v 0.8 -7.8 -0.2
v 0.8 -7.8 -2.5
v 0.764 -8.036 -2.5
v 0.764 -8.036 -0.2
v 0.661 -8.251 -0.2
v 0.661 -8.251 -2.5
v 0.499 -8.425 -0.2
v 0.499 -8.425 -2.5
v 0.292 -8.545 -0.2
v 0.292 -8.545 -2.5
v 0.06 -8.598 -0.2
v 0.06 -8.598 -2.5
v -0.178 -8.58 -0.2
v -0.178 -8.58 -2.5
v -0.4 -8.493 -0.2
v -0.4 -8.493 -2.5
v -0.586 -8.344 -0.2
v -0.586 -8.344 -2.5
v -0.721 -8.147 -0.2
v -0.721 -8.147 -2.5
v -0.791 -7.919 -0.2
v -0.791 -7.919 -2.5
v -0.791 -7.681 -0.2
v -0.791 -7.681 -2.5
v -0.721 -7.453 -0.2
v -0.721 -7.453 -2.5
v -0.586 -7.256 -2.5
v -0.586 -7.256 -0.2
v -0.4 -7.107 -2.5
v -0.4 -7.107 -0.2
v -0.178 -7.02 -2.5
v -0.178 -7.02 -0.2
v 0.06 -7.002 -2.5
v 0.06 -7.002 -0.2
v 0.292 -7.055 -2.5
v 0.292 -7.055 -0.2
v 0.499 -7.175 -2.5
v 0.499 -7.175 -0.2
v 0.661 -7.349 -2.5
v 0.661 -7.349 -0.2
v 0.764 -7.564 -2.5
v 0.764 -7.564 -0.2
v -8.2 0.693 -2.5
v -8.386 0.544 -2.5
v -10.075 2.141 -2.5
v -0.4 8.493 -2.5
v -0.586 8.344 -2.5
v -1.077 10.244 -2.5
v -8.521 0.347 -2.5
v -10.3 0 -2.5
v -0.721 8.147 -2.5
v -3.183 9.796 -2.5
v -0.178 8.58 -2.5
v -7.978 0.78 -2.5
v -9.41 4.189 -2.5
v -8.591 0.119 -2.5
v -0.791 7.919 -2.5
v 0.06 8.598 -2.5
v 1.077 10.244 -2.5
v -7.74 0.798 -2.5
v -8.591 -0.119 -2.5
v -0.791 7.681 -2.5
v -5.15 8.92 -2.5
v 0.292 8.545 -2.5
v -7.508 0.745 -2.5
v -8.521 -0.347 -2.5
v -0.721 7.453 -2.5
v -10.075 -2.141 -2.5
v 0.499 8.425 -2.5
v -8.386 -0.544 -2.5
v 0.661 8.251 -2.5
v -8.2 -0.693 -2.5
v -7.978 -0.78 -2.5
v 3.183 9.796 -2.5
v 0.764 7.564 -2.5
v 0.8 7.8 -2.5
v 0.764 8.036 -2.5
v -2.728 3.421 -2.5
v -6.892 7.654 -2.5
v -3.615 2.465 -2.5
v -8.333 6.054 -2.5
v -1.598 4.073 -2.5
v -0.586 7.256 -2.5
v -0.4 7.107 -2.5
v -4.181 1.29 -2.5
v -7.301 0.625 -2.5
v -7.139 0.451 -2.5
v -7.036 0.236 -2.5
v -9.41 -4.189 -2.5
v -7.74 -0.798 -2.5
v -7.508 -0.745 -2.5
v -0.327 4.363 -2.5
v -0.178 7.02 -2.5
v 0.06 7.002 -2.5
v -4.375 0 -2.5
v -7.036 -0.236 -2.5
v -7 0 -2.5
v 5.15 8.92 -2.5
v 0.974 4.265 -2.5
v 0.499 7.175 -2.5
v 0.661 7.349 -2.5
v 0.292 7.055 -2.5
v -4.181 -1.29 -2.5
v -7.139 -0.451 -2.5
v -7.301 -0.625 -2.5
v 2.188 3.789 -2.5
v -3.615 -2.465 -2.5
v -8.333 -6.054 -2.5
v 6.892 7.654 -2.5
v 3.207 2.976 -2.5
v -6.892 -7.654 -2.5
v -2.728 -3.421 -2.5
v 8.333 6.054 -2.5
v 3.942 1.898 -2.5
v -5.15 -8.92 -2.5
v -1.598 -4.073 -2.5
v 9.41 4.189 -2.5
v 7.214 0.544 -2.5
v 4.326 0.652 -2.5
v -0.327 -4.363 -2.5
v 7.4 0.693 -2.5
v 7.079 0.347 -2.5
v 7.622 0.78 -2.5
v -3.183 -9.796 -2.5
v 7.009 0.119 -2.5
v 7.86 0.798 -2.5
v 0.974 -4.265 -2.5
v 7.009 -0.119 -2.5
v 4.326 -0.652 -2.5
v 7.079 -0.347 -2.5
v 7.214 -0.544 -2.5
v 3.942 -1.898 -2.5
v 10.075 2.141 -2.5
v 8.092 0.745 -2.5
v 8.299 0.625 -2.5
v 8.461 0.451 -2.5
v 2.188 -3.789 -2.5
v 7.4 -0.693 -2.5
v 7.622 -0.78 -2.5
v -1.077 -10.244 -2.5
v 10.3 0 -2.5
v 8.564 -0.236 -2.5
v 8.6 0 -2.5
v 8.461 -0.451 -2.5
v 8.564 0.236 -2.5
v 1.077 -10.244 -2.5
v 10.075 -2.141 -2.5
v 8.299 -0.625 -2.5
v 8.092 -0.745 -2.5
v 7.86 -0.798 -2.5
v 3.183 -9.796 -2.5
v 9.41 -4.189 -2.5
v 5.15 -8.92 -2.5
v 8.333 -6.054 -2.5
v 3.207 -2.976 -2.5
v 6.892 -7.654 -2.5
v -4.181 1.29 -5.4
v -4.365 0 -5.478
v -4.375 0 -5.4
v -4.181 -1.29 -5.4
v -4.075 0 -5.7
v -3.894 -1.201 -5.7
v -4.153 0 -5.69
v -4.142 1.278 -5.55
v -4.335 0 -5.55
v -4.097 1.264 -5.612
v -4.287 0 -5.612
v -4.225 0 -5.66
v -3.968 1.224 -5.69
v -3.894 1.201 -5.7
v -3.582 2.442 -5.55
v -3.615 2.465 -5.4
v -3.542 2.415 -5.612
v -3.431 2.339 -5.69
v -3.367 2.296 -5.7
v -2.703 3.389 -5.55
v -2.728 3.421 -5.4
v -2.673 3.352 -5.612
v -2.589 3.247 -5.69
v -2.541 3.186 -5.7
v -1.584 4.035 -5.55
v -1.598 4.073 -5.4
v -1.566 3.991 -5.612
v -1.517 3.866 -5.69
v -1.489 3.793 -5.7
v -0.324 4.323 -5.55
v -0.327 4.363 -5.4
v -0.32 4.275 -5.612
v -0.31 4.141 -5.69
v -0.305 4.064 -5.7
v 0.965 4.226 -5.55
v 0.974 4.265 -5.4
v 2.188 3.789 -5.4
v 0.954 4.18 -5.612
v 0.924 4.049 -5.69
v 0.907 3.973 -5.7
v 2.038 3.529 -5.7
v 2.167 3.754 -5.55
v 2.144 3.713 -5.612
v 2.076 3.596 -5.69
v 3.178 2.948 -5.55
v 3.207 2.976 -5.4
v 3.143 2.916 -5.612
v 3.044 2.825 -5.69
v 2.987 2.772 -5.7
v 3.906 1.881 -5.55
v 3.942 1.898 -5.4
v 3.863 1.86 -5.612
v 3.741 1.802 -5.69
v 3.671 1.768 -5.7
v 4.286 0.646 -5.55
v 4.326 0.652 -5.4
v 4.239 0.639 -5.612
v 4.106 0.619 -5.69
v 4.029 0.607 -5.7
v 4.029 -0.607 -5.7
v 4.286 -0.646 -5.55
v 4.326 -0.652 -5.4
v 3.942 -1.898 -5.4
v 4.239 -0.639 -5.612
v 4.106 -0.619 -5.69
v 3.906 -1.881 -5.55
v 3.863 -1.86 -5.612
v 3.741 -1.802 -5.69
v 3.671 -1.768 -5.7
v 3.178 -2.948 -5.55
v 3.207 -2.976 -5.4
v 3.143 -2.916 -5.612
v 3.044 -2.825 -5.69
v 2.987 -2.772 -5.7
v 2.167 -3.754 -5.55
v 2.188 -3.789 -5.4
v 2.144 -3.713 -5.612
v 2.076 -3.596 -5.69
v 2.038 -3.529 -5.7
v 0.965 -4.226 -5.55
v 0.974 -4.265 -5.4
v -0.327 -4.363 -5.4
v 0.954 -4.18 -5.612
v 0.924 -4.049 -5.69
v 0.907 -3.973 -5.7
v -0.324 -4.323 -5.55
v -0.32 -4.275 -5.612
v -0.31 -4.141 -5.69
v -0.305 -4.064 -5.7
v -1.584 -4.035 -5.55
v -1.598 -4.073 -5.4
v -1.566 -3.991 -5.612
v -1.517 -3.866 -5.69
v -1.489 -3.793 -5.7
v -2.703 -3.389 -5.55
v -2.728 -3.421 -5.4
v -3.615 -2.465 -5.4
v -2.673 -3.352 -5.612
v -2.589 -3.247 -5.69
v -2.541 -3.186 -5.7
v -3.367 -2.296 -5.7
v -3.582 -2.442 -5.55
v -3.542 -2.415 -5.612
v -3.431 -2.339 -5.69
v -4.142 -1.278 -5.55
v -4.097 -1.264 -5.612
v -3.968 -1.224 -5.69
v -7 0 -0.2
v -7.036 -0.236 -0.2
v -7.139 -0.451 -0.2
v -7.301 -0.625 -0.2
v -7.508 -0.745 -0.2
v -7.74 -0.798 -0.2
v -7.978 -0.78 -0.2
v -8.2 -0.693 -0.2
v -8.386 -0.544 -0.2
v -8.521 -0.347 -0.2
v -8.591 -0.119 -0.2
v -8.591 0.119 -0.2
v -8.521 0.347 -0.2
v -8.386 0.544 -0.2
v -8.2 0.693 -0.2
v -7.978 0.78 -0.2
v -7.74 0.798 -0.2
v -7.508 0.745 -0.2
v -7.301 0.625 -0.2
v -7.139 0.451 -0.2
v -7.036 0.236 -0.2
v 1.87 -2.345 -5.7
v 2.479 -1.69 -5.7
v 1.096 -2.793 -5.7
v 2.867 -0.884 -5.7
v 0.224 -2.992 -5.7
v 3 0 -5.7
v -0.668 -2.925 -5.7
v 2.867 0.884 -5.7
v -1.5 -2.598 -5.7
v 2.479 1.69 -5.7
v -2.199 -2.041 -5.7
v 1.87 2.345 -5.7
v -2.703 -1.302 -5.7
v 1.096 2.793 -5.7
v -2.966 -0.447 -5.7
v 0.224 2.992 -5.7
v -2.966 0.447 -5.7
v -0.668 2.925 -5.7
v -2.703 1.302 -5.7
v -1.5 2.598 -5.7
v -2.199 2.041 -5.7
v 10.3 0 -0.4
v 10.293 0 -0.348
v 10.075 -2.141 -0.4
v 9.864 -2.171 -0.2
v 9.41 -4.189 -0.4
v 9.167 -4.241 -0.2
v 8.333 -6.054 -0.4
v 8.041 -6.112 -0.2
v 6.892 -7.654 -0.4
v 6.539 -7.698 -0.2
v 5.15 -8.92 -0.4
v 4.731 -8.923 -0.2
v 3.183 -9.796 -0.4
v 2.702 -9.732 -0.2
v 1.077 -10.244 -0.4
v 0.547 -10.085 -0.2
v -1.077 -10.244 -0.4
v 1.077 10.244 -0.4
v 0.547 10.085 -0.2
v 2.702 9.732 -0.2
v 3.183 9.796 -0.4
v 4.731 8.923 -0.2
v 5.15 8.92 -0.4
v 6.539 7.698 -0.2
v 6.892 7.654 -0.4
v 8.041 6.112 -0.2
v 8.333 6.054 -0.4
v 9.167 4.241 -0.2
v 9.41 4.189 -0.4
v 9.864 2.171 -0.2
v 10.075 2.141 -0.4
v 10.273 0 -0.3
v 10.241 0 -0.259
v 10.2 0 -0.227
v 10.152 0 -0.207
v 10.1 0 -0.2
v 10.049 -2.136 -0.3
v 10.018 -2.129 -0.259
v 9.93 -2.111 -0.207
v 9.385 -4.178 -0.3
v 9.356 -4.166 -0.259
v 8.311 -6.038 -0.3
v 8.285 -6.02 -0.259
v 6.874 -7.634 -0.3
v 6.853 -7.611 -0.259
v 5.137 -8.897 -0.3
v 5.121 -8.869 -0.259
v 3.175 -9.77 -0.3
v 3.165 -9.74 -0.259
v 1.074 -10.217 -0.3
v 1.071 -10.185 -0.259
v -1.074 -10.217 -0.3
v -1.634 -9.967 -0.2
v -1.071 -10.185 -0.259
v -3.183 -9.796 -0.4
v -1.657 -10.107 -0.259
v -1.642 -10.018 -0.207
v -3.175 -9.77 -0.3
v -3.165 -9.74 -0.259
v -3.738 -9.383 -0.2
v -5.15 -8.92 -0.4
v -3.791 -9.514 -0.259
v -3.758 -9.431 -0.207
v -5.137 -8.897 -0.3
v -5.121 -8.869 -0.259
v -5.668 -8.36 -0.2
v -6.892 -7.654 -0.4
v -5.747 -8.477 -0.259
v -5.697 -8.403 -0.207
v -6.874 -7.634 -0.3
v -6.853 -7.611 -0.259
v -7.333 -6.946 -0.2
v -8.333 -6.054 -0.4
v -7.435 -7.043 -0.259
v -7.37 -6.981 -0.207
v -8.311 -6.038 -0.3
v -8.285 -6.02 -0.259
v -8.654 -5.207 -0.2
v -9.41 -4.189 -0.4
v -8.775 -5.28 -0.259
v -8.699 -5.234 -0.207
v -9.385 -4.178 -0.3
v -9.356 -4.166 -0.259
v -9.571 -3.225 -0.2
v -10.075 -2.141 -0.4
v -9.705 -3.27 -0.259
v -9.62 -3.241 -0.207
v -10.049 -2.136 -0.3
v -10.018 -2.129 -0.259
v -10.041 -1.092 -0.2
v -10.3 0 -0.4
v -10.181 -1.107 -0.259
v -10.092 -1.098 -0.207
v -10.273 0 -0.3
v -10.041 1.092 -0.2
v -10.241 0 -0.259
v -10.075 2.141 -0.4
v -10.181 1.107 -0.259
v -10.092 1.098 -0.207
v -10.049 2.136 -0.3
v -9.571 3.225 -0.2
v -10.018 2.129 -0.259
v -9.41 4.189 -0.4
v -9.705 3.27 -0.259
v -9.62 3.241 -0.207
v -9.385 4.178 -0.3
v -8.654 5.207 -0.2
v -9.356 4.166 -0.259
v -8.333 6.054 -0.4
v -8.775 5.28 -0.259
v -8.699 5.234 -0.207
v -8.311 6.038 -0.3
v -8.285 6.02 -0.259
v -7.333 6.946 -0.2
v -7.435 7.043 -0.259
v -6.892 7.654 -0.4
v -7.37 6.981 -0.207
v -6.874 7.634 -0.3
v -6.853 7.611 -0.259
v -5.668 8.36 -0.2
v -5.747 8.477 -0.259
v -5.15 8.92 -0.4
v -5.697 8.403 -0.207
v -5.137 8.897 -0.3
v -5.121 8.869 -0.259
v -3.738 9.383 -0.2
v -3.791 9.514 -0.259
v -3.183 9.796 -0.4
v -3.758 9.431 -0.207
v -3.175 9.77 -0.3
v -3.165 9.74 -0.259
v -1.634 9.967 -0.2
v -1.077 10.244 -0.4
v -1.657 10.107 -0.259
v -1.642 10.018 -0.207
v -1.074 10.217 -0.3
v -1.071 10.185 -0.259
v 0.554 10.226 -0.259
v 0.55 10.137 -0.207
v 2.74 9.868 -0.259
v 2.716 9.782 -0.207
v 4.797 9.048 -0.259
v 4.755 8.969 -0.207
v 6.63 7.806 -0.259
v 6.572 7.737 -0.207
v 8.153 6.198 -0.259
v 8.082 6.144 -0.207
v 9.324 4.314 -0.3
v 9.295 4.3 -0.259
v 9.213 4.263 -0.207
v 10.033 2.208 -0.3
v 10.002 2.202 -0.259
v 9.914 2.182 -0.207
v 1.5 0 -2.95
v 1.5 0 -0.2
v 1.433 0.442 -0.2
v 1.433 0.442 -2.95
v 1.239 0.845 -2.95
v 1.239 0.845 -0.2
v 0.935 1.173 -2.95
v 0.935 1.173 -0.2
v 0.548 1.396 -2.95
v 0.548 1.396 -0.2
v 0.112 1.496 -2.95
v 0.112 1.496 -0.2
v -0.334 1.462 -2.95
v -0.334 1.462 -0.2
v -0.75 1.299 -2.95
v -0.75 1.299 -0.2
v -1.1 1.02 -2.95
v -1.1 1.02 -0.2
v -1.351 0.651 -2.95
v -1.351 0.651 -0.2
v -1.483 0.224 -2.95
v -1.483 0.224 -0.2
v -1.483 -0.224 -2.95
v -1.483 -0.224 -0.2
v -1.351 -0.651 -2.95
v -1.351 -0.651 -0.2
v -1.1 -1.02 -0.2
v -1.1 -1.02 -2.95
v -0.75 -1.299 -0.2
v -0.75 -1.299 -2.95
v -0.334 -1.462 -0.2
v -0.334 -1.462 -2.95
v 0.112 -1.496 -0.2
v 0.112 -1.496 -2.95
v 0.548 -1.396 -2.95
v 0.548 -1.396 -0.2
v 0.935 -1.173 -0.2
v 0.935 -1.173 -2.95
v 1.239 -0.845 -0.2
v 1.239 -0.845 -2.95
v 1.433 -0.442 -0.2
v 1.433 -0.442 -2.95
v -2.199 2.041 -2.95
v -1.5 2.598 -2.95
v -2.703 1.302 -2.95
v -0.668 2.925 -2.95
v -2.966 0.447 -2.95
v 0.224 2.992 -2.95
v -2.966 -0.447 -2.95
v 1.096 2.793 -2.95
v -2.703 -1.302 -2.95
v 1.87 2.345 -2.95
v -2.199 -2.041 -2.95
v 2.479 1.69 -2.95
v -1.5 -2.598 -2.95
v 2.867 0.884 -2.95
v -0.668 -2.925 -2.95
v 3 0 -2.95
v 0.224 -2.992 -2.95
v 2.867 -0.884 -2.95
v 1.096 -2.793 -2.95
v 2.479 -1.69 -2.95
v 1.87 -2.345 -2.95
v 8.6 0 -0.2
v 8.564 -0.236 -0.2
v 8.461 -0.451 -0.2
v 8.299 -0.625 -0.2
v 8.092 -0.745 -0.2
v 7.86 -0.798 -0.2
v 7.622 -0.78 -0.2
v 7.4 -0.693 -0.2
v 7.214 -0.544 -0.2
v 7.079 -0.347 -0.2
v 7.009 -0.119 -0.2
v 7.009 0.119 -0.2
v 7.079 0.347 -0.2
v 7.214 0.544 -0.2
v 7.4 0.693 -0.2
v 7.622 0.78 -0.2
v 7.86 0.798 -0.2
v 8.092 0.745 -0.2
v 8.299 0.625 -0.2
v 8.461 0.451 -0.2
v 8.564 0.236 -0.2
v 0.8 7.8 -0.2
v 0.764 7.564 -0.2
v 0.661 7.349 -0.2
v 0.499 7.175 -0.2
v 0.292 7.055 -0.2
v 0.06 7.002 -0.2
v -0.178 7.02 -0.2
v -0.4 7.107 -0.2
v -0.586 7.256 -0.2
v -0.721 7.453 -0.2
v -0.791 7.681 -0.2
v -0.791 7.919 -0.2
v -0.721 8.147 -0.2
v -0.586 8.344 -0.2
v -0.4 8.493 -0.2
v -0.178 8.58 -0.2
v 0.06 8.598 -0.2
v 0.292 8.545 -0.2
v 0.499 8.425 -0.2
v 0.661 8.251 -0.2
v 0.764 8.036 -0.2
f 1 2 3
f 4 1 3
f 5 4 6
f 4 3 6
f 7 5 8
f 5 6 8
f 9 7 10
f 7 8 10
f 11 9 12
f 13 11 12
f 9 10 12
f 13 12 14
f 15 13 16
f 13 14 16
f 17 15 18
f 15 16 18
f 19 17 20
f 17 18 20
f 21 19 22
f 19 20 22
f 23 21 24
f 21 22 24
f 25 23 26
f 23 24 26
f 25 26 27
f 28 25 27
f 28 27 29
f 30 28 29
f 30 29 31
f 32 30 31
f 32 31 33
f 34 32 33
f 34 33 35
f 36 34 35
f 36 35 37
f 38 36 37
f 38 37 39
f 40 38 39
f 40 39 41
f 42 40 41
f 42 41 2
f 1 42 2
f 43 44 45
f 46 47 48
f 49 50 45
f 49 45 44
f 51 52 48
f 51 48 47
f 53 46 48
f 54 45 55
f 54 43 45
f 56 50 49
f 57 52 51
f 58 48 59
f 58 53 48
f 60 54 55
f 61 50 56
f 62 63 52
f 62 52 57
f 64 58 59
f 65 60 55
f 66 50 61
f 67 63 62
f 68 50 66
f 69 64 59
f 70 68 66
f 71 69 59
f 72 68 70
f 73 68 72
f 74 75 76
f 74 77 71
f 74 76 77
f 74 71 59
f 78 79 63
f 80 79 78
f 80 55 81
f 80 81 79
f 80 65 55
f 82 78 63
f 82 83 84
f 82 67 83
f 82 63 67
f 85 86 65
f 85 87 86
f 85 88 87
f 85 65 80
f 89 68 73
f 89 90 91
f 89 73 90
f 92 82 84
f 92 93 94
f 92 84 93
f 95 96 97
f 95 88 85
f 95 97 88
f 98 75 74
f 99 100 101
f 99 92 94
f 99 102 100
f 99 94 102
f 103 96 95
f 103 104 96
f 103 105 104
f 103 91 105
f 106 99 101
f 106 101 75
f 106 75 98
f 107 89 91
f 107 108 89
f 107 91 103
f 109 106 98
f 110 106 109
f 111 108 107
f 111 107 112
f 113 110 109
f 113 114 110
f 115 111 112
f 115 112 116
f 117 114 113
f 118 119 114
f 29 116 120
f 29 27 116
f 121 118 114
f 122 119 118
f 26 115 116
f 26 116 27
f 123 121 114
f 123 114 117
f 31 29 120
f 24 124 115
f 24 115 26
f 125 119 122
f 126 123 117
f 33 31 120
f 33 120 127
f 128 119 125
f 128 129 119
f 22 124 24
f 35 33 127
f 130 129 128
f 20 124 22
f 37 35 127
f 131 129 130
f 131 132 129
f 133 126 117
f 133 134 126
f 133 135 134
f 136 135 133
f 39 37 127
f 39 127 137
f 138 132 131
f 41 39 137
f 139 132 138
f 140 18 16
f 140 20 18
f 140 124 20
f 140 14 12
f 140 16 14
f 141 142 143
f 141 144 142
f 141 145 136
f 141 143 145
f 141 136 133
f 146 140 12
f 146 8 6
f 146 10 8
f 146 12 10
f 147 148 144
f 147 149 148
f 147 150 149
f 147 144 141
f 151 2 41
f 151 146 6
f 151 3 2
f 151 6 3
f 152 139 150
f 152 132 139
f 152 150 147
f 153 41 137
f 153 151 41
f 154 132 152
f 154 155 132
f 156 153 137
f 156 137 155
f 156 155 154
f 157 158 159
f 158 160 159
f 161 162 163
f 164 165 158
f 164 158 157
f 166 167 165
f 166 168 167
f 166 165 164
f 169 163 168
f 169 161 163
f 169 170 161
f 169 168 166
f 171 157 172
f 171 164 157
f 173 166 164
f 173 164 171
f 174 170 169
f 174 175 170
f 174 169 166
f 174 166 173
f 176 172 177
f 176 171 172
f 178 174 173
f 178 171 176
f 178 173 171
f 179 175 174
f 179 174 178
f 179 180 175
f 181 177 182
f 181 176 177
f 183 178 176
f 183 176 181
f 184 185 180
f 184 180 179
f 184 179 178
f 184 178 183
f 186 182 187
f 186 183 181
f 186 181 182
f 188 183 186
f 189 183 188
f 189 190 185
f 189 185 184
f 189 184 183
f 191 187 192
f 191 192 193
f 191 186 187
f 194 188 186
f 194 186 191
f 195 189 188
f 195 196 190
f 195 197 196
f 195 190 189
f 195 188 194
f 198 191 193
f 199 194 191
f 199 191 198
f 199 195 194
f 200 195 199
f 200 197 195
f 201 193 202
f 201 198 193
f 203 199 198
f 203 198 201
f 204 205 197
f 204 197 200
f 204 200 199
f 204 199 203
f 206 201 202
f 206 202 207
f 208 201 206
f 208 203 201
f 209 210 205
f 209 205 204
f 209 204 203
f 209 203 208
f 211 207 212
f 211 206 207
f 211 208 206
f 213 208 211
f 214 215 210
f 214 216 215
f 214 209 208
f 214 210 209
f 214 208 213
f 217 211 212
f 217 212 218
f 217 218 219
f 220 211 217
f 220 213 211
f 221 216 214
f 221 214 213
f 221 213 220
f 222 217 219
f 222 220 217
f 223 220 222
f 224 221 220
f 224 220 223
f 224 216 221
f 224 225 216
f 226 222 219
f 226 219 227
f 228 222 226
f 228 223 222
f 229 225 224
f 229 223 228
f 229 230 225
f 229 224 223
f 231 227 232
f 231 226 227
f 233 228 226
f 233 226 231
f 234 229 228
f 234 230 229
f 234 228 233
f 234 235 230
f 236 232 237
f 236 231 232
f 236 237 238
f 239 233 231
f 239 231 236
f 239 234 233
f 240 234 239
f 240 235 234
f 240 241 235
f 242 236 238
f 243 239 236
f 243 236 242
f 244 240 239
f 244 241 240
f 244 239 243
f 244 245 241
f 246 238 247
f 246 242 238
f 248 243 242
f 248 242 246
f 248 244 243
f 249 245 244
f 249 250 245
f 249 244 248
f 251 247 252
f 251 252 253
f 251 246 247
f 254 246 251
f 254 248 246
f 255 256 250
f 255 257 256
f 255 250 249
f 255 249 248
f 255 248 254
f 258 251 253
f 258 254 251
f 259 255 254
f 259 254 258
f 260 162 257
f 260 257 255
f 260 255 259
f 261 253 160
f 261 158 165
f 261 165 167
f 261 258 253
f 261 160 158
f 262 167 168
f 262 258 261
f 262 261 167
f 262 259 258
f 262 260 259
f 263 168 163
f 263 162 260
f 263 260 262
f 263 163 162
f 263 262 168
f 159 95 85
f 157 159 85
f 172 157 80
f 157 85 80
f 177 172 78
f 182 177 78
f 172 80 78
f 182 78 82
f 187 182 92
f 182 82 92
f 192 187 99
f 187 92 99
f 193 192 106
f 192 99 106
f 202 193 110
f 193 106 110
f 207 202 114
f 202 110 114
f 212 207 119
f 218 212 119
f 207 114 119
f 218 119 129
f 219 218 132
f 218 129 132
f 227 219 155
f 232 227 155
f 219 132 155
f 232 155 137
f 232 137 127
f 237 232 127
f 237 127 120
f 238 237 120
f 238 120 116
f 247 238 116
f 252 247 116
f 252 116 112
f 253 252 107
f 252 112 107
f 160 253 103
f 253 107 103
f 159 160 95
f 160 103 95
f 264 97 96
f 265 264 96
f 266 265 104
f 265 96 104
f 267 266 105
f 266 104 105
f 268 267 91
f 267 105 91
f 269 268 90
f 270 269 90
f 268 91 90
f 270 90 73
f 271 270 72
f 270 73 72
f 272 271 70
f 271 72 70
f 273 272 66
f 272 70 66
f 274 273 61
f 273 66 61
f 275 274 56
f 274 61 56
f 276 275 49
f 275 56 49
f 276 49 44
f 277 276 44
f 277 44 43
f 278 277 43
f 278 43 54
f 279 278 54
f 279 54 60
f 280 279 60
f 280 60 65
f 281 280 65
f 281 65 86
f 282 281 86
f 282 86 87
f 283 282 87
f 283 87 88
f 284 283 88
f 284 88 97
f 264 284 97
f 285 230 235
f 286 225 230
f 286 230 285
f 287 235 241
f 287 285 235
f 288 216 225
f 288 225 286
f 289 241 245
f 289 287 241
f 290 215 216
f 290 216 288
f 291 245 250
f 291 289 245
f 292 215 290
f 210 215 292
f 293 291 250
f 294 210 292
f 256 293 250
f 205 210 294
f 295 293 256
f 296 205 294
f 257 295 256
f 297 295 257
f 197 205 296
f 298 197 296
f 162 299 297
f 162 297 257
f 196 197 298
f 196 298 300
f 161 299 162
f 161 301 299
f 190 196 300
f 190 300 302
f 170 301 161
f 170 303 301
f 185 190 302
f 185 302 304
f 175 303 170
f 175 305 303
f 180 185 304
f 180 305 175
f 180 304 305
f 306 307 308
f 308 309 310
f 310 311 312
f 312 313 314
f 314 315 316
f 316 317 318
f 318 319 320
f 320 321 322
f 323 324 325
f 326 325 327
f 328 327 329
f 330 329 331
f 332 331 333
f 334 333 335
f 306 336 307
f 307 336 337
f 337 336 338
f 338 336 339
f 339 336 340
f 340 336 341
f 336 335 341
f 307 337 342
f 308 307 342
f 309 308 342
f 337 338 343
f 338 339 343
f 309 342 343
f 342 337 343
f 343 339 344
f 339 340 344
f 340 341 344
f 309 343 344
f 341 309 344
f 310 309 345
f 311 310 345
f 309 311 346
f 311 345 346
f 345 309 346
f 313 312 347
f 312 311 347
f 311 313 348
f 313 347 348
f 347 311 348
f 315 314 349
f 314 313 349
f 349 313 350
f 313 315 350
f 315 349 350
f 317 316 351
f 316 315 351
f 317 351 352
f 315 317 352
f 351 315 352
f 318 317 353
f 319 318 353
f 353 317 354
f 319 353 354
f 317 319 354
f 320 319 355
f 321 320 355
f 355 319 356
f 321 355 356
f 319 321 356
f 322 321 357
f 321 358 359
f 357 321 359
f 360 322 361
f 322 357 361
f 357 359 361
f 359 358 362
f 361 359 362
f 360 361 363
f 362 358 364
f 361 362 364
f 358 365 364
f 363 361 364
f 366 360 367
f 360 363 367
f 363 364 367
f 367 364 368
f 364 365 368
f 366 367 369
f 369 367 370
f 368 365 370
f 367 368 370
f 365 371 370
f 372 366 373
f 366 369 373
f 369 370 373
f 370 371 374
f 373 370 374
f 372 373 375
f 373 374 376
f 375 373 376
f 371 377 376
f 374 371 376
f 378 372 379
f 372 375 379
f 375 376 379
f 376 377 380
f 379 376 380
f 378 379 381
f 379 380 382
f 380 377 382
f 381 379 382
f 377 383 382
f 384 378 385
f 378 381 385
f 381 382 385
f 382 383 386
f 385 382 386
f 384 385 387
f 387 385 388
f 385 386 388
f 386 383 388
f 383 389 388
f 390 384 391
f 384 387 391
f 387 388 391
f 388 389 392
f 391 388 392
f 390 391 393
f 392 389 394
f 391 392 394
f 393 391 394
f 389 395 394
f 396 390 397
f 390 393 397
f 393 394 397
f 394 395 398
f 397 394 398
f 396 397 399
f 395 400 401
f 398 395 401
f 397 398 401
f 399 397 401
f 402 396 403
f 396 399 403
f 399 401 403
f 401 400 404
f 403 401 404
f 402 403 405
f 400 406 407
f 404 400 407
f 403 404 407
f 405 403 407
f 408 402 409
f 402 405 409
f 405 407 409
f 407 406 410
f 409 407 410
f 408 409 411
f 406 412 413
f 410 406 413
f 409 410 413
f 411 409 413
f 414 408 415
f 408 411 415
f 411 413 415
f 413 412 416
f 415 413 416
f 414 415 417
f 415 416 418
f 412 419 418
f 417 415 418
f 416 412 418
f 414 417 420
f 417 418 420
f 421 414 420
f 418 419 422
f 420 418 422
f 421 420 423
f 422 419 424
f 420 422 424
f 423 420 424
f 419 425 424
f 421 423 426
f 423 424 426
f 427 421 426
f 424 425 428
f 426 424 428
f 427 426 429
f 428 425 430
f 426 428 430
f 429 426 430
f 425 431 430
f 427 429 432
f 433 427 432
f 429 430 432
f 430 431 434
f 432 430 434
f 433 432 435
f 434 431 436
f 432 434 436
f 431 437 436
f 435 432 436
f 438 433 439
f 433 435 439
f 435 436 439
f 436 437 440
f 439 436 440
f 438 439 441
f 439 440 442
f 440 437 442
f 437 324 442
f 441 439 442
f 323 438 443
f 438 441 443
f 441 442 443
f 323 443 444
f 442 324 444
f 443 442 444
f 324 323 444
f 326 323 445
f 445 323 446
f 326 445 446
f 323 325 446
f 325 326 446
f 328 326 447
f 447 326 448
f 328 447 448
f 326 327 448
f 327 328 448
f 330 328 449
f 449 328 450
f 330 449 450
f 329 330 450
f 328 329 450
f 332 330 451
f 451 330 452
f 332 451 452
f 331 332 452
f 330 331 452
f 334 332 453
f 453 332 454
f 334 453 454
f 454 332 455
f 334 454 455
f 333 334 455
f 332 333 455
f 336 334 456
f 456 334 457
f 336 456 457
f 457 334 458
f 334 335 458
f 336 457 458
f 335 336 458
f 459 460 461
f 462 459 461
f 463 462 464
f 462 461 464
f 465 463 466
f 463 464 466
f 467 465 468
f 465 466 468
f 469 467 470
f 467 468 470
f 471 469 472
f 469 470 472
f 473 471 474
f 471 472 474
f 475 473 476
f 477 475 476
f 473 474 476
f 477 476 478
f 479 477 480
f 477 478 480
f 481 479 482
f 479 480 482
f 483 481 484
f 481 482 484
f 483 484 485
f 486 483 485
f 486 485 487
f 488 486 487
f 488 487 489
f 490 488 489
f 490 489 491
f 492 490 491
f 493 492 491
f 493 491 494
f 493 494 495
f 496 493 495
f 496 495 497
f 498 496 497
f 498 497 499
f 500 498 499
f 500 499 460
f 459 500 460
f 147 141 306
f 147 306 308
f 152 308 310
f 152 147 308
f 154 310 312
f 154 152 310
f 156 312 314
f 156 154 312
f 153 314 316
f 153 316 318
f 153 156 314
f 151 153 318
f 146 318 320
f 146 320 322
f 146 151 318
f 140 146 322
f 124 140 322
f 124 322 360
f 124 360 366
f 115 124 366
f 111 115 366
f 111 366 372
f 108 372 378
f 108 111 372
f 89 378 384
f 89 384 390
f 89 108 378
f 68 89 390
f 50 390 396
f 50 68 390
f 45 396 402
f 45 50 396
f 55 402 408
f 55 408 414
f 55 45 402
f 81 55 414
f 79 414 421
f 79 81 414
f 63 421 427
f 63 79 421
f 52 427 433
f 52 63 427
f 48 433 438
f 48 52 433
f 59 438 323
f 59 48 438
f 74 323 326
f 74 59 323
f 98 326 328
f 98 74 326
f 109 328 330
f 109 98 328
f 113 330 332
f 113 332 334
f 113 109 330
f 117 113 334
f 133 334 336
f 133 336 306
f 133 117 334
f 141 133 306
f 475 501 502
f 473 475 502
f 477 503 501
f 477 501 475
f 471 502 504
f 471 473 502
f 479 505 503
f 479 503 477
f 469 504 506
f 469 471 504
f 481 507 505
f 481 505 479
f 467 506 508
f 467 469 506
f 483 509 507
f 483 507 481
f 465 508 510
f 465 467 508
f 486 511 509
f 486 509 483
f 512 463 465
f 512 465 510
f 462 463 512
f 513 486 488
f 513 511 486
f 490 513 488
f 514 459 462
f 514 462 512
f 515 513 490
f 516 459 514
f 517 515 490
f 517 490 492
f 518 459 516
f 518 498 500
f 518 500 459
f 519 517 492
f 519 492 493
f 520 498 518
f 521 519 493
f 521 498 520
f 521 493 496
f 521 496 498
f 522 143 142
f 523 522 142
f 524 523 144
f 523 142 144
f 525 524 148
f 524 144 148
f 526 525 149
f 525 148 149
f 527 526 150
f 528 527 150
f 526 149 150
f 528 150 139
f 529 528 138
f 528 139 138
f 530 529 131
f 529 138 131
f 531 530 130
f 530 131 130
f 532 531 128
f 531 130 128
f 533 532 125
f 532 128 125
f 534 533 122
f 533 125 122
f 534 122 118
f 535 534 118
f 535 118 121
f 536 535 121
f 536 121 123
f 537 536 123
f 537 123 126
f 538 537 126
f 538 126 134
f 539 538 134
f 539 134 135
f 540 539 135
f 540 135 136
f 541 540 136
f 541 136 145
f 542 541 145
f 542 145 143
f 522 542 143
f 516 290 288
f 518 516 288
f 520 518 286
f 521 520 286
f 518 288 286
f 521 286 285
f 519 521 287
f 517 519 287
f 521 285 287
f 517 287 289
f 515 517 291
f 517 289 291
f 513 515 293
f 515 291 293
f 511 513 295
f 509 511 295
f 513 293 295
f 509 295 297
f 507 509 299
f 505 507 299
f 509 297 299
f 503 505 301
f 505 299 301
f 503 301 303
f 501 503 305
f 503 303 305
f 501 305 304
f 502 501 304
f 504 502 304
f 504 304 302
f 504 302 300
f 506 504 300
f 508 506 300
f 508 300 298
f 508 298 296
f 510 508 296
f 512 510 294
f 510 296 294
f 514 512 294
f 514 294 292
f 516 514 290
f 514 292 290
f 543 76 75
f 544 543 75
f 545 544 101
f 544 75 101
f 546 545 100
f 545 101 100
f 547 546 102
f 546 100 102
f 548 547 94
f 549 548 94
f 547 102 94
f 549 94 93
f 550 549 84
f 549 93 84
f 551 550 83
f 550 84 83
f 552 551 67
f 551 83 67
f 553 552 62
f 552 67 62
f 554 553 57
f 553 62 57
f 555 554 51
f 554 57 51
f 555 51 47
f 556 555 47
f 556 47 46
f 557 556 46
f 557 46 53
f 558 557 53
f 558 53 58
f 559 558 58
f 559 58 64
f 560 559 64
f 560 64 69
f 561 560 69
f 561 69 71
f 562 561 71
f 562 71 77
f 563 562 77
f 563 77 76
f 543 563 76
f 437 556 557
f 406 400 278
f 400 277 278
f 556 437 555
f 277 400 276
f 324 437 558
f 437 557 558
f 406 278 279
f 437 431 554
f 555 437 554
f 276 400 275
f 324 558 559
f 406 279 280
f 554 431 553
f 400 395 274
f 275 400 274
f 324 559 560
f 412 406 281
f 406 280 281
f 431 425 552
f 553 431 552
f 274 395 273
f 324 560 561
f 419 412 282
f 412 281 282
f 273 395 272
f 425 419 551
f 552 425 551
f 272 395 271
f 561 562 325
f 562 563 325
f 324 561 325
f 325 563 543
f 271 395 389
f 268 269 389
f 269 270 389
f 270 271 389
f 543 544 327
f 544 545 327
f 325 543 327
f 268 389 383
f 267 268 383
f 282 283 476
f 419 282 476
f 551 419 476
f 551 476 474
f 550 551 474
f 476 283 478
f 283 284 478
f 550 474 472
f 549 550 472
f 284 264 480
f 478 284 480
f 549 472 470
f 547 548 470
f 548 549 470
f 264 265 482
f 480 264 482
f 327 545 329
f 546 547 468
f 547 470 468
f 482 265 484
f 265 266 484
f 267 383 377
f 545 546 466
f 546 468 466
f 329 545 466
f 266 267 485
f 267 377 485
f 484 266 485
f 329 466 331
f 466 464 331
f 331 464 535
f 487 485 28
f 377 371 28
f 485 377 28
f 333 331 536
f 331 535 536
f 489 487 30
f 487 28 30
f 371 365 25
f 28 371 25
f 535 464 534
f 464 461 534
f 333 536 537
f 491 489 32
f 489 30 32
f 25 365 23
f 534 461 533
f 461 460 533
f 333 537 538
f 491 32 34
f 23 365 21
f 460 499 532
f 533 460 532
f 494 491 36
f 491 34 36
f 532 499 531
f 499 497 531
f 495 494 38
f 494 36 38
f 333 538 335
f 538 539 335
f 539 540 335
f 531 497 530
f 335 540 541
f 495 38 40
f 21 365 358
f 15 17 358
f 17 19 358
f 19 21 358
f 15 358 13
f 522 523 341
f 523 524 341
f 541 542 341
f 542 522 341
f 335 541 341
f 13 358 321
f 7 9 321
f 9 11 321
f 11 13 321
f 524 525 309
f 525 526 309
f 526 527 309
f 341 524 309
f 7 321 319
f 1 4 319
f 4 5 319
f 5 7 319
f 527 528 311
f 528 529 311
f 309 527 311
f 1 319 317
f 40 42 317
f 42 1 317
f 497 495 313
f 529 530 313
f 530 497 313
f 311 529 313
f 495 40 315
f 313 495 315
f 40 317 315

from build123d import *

# Parameters (mm, degrees)
SKETCH1_R           = 10.3
BOSS_EXTRUDE1_DEPTH = 2.3
SKETCH2_R           = 4.375
BOSS_EXTRUDE2_DEPTH = 3.2
SKETCH3_R           = 3
CUT_EXTRUDE1_DEPTH  = 2.75
SKETCH4_R           = 1.5
CUT_EXTRUDE2_DEPTH  = 16.570163776
SKETCH12_R          = 0.8
CUT_EXTRUDE10_DEPTH = 15.913752043
FILLET2_R           = 0.2
FILLET3_R           = 0.3


with BuildPart() as part:
    # Sketch1 → Boss-Extrude1 (new body)
    with BuildSketch(Plane(origin=(0, 0, -2.5), x_dir=(-1, 0, 0), z_dir=(0, 0, -1))):
        with Locations(Location((0, 0, 0), (0, 0, 180))):
            Circle(SKETCH1_R)
    extrude(amount=-BOSS_EXTRUDE1_DEPTH)

    # Sketch2 → Boss-Extrude2 (add)
    with BuildSketch(Plane(origin=(0, 0, -2.5), x_dir=(-1, 0, 0), z_dir=(0, 0, -1))):
        Circle(SKETCH2_R)
    extrude(amount=BOSS_EXTRUDE2_DEPTH)

    # Sketch3 → Cut-Extrude1 (cut)
    with BuildSketch(Plane(origin=(0, 0, -5.7), x_dir=(-1, 0, 0), z_dir=(0, 0, -1))):
        with Locations(Location((0, 0, 0), (0, 0, 180))):
            Circle(SKETCH3_R)
    extrude(amount=-CUT_EXTRUDE1_DEPTH, mode=Mode.SUBTRACT)

    # Sketch4 → Cut-Extrude2 (cut, through all)
    with BuildSketch(Plane.XY.offset(-0.2)):
        Circle(SKETCH4_R)
    extrude(amount=-CUT_EXTRUDE2_DEPTH, mode=Mode.SUBTRACT)

    # Sketch12 → Cut-Extrude10 (cut, through all)
    with BuildSketch(Plane(origin=(0, 0, -2.5), x_dir=(-1, 0, 0), z_dir=(0, 0, -1))):
        with Locations(Location((0, 7.8, 0), (0, 0, 180))):
            Circle(SKETCH12_R)
        with Locations(Location((7.8, 0, 0), (0, 0, 180))):
            Circle(SKETCH12_R)
        with Locations(Location((0, -7.8, 0), (0, 0, 180))):
            Circle(SKETCH12_R)
        with Locations(Location((-7.8, 0, 0), (0, 0, 180))):
            Circle(SKETCH12_R)
    extrude(amount=-CUT_EXTRUDE10_DEPTH, mode=Mode.SUBTRACT)

    # Fillet2
    fillet2_edges = [part.edges().sort_by_distance(p)[0] for p in [
        (-10.3, 0, -0.2),
    ]]
    fillet(fillet2_edges, radius=FILLET2_R)

    # Fillet3
    fillet3_edges = [part.edges().sort_by_distance(p)[0] for p in [
        (4.375, 0, -5.7),
    ]]
    fillet(fillet3_edges, radius=FILLET3_R)


solid = part.part
